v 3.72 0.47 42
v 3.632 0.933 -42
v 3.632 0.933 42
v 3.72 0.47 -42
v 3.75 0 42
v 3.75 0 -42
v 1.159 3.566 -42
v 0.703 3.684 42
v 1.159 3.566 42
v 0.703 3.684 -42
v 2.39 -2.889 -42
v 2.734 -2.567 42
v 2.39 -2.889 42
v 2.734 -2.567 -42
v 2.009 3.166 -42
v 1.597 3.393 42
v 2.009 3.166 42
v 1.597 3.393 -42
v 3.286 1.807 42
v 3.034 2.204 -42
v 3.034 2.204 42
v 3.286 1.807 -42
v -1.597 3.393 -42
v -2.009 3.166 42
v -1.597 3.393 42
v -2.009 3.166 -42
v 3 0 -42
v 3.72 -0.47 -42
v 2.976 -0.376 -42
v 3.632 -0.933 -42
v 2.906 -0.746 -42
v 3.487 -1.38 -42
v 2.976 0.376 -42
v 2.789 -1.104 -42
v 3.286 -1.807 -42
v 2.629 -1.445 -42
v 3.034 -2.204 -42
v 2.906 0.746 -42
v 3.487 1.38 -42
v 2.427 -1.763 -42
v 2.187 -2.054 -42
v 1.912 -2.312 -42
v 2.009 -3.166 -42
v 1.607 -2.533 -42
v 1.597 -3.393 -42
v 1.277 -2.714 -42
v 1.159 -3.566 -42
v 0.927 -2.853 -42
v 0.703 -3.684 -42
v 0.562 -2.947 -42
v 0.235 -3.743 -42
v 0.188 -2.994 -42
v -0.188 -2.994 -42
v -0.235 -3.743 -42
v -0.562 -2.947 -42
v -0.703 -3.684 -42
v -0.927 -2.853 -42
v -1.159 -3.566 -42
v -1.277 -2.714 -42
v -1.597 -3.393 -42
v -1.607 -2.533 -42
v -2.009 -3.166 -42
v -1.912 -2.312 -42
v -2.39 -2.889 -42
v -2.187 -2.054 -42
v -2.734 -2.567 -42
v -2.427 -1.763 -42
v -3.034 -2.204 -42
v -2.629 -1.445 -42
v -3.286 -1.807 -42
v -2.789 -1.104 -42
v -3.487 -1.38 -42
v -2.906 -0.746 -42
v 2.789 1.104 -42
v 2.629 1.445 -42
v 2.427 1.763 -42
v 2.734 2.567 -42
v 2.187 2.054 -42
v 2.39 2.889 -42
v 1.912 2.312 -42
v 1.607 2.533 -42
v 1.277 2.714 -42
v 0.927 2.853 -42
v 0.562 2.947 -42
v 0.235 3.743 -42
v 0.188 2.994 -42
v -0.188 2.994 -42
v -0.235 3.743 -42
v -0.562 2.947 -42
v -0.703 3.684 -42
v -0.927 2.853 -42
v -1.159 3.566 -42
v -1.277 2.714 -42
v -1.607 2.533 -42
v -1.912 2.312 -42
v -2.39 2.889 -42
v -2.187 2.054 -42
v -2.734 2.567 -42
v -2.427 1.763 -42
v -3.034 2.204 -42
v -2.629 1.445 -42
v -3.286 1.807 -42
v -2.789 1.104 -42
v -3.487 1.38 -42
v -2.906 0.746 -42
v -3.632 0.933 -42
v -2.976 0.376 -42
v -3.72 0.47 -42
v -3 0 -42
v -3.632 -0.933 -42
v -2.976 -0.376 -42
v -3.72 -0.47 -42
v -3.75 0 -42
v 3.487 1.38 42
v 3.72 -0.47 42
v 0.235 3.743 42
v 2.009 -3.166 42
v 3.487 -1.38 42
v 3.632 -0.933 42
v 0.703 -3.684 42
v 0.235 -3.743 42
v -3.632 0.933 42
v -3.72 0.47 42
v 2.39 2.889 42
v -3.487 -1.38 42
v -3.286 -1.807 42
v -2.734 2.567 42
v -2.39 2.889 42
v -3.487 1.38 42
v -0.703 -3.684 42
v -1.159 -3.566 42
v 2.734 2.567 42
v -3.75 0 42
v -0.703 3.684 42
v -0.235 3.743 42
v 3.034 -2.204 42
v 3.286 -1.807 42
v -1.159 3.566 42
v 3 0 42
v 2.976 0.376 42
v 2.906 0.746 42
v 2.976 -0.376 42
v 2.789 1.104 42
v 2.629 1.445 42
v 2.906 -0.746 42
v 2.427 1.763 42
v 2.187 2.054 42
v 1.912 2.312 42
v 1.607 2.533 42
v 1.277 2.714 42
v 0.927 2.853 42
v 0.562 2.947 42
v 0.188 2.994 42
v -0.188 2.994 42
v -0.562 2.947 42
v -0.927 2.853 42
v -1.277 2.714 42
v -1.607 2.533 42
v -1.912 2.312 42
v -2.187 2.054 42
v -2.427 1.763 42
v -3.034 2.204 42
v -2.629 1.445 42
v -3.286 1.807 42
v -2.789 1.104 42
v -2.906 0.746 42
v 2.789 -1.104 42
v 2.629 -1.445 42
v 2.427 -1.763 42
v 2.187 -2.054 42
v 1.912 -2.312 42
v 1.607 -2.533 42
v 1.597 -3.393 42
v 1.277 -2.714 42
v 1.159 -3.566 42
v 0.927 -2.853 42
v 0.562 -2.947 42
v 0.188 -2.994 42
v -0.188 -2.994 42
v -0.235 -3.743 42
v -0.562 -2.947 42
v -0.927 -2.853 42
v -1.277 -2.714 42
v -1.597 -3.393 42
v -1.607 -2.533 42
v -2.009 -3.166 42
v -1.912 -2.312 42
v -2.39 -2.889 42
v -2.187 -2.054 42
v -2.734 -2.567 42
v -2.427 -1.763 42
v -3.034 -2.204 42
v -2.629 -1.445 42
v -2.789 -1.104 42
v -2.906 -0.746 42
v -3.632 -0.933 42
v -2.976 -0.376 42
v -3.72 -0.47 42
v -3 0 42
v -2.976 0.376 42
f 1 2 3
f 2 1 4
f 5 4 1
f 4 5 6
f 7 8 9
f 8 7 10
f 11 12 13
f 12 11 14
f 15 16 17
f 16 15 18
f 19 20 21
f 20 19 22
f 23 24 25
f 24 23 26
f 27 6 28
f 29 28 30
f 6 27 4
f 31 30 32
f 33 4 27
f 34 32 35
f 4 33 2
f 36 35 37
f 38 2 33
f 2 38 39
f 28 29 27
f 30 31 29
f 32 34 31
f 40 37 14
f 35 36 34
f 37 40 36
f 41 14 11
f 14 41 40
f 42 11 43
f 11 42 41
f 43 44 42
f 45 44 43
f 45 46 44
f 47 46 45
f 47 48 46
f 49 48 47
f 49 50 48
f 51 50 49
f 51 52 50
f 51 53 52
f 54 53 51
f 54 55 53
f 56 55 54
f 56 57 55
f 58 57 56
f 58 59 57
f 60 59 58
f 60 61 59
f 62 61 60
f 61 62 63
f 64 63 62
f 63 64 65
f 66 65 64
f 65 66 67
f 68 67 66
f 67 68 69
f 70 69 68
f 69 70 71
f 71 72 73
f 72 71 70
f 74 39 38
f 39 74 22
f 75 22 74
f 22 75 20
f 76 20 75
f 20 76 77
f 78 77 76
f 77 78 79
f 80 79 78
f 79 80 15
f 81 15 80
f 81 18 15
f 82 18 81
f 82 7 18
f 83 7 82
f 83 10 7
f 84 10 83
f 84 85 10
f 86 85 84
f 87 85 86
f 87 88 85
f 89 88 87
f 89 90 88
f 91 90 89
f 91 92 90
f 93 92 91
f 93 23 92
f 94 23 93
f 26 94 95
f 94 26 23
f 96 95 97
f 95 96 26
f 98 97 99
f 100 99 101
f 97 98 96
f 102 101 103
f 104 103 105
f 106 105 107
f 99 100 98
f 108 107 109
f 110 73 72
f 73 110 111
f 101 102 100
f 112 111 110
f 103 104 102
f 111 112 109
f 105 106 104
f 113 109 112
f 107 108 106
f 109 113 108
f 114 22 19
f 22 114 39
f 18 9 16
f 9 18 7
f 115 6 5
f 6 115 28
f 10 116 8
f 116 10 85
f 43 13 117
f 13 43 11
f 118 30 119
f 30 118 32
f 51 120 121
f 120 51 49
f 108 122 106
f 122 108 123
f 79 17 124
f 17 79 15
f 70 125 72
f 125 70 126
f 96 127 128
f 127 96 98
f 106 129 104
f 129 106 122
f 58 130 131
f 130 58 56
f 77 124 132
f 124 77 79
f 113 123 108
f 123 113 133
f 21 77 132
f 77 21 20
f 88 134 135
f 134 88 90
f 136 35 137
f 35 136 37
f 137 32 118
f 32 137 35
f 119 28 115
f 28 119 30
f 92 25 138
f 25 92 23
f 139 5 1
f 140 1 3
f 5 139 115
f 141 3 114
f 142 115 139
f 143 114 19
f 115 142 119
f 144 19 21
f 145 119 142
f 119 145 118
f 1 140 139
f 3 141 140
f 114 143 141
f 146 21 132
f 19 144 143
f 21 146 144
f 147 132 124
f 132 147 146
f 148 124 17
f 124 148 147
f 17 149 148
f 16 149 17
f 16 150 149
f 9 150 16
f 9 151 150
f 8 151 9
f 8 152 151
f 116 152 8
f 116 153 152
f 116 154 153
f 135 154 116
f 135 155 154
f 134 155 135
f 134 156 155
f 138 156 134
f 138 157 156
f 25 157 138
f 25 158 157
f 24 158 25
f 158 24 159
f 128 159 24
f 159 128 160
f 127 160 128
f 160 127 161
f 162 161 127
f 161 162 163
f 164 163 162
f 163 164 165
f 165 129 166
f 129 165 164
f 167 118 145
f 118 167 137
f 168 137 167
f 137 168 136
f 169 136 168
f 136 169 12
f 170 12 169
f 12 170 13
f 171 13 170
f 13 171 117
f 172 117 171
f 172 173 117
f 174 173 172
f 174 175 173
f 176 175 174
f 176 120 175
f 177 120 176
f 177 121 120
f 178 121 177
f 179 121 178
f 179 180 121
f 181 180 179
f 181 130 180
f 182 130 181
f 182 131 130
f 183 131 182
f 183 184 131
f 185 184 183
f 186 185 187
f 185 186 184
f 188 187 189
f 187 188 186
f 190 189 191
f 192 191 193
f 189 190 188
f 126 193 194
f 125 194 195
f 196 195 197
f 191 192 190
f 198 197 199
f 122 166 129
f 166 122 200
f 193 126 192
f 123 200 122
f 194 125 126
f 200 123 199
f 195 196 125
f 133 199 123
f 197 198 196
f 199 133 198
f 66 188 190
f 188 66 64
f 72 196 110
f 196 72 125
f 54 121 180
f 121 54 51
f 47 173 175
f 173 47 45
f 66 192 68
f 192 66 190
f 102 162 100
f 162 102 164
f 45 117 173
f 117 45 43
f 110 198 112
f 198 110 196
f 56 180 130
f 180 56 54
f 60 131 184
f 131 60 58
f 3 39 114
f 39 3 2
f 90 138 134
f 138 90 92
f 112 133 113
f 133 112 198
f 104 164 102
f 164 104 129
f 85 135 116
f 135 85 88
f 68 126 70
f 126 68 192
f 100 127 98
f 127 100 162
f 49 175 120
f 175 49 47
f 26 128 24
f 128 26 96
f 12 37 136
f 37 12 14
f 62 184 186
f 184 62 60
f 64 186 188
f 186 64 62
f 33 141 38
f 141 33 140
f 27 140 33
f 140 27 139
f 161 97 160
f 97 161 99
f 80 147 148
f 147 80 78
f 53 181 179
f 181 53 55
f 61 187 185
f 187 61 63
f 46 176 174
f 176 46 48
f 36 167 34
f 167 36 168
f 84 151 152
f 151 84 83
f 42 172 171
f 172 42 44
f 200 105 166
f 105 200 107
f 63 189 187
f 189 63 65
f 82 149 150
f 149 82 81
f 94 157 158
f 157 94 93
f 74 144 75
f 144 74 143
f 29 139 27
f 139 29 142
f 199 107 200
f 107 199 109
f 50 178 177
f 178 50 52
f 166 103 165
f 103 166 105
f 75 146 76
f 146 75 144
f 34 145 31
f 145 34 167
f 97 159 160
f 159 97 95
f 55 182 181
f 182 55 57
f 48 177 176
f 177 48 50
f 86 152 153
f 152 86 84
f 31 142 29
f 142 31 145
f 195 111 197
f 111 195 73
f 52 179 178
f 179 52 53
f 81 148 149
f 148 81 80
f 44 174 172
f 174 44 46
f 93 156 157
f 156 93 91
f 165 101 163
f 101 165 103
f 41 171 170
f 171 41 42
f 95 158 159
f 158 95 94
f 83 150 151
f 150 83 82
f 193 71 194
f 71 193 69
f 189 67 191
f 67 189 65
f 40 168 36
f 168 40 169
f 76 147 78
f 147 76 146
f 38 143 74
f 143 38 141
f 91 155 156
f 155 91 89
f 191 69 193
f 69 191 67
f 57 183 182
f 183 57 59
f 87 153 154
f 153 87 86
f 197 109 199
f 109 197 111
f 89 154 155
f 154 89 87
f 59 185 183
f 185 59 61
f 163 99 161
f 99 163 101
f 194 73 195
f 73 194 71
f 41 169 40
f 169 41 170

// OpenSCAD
$fn = 50;


difference() {
	union() {
		translate(v = [0, 0, -42.0000000000]) {
			cylinder(h = 84, r = 3.7500000000);
		}
	}
	union() {
		translate(v = [0, 0, -100.0000000000]) {
			cylinder(h = 200, r = 3.0000000000);
		}
	}
}
